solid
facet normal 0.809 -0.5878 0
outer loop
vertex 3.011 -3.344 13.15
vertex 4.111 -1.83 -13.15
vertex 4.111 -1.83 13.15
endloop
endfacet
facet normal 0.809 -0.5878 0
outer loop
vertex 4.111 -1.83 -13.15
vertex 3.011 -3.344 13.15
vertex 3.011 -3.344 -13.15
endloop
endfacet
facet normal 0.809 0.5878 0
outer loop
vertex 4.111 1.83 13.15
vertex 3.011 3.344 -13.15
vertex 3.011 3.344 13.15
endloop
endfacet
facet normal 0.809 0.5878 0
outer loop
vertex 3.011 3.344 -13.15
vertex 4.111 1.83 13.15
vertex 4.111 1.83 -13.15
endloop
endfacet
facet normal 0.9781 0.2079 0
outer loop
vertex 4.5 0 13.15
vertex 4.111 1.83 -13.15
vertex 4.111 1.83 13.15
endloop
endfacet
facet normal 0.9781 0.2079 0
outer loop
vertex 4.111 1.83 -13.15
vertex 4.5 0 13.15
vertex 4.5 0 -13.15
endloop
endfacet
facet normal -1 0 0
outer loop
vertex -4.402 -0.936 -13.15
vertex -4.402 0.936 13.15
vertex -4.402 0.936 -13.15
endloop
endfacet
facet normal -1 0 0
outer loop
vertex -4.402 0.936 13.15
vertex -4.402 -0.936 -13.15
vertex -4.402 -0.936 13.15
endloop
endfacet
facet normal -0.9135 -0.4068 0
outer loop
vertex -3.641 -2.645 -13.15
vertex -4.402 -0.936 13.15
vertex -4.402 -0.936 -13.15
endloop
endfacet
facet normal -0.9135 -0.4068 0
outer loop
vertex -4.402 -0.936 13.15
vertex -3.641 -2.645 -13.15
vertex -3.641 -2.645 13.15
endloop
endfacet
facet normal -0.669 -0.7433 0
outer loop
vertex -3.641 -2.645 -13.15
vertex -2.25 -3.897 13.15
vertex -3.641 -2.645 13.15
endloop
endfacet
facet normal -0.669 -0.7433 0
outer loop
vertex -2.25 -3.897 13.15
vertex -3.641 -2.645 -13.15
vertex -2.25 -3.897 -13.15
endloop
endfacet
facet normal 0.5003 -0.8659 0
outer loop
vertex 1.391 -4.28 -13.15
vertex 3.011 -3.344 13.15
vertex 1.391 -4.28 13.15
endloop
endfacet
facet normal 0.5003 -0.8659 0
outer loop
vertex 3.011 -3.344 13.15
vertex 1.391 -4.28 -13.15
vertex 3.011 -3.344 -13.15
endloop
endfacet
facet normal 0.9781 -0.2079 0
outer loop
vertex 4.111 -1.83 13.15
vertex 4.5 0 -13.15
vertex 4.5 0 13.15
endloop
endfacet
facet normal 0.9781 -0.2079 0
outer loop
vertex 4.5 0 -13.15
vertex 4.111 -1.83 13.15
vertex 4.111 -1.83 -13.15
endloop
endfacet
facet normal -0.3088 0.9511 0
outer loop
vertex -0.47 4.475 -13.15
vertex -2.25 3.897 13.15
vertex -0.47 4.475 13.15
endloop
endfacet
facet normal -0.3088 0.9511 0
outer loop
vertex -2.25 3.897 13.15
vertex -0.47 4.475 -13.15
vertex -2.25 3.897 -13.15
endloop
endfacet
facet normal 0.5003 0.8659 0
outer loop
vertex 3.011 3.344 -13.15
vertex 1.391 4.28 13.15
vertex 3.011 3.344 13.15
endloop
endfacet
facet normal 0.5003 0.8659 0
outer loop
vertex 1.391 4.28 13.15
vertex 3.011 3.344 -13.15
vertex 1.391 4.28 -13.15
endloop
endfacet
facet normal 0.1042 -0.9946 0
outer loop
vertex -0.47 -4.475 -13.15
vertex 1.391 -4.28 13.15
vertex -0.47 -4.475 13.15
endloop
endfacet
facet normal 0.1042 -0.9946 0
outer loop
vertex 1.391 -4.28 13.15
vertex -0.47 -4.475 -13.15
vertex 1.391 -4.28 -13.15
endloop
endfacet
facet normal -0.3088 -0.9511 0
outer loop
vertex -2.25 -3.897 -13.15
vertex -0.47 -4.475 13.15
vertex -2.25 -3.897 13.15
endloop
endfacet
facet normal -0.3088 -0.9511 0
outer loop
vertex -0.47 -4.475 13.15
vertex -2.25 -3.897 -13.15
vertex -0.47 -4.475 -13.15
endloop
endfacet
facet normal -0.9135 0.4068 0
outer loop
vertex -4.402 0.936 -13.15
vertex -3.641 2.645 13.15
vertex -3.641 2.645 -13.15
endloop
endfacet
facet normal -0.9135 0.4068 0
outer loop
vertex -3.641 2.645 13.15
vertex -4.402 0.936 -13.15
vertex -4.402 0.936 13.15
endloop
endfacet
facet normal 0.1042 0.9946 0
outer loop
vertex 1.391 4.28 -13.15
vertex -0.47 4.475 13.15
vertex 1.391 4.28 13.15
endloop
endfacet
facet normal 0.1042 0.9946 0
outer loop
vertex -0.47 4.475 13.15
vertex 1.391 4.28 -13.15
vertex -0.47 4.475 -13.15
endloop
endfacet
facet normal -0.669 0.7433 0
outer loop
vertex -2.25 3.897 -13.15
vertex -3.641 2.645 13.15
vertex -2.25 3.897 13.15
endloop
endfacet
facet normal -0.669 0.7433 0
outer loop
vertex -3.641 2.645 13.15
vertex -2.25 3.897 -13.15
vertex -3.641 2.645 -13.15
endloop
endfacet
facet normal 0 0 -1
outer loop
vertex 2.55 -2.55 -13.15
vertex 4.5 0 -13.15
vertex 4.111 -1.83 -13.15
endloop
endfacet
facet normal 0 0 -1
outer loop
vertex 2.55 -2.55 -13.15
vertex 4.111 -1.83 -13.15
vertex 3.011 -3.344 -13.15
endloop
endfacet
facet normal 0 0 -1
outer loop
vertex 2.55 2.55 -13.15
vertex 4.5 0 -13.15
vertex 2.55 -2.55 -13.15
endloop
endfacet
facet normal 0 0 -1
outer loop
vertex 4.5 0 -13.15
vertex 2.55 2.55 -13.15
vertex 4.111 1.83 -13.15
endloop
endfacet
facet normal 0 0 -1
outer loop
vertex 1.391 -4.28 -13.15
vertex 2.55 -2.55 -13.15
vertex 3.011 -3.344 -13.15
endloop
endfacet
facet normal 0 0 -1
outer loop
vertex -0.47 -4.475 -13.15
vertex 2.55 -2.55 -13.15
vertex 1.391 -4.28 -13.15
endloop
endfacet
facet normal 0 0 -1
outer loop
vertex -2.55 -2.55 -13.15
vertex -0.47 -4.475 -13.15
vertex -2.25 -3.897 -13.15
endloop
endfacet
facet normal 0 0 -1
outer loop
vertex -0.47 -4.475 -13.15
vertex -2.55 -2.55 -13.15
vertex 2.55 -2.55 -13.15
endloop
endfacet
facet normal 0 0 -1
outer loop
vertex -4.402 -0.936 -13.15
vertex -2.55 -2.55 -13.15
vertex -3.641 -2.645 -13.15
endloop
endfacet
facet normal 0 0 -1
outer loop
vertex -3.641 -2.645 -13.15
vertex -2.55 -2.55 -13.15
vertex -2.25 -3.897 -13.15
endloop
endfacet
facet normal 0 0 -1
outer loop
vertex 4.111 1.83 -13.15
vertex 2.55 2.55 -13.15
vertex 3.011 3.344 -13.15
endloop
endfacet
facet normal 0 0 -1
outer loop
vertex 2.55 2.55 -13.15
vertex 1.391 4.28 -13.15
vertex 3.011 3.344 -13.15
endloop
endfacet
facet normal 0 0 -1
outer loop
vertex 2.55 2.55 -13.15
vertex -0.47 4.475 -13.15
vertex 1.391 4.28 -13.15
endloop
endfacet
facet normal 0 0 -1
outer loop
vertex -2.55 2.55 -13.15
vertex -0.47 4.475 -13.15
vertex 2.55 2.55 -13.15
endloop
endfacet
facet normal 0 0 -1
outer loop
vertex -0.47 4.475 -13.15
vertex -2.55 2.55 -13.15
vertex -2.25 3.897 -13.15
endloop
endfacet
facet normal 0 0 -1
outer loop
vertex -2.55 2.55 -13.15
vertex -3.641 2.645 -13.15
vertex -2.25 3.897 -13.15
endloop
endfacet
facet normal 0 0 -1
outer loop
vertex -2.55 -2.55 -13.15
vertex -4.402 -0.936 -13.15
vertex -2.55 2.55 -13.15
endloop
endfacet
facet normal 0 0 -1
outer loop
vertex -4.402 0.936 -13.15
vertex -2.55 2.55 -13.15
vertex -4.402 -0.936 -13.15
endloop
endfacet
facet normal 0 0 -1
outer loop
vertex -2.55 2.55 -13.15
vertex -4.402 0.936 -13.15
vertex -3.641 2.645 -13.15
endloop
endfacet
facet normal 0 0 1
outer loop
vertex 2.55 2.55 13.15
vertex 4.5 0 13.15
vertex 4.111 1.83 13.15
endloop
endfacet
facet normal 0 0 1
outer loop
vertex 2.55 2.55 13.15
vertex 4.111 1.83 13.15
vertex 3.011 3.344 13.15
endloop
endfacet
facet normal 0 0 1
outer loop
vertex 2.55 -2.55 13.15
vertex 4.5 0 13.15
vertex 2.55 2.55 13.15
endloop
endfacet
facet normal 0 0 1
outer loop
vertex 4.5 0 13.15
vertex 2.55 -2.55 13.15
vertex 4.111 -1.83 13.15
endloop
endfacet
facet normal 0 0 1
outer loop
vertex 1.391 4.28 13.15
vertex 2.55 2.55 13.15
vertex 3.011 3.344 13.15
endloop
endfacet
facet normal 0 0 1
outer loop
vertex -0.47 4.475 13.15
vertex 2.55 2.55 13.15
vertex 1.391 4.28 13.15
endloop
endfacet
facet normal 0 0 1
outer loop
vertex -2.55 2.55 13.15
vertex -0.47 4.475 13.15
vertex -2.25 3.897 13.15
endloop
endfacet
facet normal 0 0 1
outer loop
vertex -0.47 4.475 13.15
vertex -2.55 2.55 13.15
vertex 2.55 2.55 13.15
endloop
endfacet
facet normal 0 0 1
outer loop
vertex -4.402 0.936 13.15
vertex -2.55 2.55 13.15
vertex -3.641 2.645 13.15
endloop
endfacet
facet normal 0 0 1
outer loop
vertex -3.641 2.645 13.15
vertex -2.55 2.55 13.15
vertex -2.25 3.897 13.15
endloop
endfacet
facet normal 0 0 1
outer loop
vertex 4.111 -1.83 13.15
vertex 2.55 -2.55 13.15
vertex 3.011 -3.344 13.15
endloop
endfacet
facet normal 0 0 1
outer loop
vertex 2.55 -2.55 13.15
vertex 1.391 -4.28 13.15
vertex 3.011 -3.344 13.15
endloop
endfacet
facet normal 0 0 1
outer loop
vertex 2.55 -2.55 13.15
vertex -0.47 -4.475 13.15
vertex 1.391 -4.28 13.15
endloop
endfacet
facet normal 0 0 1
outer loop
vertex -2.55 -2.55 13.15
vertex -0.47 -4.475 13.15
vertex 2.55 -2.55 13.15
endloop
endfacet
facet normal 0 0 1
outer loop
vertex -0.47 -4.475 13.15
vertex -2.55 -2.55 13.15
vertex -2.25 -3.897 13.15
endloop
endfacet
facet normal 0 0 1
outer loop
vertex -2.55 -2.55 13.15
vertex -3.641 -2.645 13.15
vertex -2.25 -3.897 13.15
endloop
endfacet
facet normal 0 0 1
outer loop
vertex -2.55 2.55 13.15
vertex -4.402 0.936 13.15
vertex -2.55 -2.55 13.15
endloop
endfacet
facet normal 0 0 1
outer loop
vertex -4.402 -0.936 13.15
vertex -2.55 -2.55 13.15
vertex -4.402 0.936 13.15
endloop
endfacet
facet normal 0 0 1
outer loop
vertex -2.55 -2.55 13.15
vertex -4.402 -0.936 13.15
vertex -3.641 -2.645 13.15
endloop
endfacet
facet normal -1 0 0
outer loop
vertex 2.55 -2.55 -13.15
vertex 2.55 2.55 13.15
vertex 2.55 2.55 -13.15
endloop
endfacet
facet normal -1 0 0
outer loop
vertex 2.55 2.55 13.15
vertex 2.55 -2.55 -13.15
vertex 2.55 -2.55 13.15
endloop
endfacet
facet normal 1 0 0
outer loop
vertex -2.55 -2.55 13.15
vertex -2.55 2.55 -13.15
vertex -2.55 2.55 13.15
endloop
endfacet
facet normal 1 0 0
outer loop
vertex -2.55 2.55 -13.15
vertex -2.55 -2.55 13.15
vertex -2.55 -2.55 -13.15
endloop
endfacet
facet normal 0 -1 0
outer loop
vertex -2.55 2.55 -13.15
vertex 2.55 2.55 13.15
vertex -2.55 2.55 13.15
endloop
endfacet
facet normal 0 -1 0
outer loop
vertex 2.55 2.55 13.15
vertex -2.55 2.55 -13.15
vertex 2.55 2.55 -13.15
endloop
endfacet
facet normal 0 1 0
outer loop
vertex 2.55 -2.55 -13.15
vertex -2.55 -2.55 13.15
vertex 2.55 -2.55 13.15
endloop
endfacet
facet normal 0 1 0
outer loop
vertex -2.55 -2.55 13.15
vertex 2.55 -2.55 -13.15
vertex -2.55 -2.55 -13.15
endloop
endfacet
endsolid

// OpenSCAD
difference() {
    cylinder(h = 26.3, d = 9, center = true);
    cube([5.1, 5.1, 30], center = true);
}
